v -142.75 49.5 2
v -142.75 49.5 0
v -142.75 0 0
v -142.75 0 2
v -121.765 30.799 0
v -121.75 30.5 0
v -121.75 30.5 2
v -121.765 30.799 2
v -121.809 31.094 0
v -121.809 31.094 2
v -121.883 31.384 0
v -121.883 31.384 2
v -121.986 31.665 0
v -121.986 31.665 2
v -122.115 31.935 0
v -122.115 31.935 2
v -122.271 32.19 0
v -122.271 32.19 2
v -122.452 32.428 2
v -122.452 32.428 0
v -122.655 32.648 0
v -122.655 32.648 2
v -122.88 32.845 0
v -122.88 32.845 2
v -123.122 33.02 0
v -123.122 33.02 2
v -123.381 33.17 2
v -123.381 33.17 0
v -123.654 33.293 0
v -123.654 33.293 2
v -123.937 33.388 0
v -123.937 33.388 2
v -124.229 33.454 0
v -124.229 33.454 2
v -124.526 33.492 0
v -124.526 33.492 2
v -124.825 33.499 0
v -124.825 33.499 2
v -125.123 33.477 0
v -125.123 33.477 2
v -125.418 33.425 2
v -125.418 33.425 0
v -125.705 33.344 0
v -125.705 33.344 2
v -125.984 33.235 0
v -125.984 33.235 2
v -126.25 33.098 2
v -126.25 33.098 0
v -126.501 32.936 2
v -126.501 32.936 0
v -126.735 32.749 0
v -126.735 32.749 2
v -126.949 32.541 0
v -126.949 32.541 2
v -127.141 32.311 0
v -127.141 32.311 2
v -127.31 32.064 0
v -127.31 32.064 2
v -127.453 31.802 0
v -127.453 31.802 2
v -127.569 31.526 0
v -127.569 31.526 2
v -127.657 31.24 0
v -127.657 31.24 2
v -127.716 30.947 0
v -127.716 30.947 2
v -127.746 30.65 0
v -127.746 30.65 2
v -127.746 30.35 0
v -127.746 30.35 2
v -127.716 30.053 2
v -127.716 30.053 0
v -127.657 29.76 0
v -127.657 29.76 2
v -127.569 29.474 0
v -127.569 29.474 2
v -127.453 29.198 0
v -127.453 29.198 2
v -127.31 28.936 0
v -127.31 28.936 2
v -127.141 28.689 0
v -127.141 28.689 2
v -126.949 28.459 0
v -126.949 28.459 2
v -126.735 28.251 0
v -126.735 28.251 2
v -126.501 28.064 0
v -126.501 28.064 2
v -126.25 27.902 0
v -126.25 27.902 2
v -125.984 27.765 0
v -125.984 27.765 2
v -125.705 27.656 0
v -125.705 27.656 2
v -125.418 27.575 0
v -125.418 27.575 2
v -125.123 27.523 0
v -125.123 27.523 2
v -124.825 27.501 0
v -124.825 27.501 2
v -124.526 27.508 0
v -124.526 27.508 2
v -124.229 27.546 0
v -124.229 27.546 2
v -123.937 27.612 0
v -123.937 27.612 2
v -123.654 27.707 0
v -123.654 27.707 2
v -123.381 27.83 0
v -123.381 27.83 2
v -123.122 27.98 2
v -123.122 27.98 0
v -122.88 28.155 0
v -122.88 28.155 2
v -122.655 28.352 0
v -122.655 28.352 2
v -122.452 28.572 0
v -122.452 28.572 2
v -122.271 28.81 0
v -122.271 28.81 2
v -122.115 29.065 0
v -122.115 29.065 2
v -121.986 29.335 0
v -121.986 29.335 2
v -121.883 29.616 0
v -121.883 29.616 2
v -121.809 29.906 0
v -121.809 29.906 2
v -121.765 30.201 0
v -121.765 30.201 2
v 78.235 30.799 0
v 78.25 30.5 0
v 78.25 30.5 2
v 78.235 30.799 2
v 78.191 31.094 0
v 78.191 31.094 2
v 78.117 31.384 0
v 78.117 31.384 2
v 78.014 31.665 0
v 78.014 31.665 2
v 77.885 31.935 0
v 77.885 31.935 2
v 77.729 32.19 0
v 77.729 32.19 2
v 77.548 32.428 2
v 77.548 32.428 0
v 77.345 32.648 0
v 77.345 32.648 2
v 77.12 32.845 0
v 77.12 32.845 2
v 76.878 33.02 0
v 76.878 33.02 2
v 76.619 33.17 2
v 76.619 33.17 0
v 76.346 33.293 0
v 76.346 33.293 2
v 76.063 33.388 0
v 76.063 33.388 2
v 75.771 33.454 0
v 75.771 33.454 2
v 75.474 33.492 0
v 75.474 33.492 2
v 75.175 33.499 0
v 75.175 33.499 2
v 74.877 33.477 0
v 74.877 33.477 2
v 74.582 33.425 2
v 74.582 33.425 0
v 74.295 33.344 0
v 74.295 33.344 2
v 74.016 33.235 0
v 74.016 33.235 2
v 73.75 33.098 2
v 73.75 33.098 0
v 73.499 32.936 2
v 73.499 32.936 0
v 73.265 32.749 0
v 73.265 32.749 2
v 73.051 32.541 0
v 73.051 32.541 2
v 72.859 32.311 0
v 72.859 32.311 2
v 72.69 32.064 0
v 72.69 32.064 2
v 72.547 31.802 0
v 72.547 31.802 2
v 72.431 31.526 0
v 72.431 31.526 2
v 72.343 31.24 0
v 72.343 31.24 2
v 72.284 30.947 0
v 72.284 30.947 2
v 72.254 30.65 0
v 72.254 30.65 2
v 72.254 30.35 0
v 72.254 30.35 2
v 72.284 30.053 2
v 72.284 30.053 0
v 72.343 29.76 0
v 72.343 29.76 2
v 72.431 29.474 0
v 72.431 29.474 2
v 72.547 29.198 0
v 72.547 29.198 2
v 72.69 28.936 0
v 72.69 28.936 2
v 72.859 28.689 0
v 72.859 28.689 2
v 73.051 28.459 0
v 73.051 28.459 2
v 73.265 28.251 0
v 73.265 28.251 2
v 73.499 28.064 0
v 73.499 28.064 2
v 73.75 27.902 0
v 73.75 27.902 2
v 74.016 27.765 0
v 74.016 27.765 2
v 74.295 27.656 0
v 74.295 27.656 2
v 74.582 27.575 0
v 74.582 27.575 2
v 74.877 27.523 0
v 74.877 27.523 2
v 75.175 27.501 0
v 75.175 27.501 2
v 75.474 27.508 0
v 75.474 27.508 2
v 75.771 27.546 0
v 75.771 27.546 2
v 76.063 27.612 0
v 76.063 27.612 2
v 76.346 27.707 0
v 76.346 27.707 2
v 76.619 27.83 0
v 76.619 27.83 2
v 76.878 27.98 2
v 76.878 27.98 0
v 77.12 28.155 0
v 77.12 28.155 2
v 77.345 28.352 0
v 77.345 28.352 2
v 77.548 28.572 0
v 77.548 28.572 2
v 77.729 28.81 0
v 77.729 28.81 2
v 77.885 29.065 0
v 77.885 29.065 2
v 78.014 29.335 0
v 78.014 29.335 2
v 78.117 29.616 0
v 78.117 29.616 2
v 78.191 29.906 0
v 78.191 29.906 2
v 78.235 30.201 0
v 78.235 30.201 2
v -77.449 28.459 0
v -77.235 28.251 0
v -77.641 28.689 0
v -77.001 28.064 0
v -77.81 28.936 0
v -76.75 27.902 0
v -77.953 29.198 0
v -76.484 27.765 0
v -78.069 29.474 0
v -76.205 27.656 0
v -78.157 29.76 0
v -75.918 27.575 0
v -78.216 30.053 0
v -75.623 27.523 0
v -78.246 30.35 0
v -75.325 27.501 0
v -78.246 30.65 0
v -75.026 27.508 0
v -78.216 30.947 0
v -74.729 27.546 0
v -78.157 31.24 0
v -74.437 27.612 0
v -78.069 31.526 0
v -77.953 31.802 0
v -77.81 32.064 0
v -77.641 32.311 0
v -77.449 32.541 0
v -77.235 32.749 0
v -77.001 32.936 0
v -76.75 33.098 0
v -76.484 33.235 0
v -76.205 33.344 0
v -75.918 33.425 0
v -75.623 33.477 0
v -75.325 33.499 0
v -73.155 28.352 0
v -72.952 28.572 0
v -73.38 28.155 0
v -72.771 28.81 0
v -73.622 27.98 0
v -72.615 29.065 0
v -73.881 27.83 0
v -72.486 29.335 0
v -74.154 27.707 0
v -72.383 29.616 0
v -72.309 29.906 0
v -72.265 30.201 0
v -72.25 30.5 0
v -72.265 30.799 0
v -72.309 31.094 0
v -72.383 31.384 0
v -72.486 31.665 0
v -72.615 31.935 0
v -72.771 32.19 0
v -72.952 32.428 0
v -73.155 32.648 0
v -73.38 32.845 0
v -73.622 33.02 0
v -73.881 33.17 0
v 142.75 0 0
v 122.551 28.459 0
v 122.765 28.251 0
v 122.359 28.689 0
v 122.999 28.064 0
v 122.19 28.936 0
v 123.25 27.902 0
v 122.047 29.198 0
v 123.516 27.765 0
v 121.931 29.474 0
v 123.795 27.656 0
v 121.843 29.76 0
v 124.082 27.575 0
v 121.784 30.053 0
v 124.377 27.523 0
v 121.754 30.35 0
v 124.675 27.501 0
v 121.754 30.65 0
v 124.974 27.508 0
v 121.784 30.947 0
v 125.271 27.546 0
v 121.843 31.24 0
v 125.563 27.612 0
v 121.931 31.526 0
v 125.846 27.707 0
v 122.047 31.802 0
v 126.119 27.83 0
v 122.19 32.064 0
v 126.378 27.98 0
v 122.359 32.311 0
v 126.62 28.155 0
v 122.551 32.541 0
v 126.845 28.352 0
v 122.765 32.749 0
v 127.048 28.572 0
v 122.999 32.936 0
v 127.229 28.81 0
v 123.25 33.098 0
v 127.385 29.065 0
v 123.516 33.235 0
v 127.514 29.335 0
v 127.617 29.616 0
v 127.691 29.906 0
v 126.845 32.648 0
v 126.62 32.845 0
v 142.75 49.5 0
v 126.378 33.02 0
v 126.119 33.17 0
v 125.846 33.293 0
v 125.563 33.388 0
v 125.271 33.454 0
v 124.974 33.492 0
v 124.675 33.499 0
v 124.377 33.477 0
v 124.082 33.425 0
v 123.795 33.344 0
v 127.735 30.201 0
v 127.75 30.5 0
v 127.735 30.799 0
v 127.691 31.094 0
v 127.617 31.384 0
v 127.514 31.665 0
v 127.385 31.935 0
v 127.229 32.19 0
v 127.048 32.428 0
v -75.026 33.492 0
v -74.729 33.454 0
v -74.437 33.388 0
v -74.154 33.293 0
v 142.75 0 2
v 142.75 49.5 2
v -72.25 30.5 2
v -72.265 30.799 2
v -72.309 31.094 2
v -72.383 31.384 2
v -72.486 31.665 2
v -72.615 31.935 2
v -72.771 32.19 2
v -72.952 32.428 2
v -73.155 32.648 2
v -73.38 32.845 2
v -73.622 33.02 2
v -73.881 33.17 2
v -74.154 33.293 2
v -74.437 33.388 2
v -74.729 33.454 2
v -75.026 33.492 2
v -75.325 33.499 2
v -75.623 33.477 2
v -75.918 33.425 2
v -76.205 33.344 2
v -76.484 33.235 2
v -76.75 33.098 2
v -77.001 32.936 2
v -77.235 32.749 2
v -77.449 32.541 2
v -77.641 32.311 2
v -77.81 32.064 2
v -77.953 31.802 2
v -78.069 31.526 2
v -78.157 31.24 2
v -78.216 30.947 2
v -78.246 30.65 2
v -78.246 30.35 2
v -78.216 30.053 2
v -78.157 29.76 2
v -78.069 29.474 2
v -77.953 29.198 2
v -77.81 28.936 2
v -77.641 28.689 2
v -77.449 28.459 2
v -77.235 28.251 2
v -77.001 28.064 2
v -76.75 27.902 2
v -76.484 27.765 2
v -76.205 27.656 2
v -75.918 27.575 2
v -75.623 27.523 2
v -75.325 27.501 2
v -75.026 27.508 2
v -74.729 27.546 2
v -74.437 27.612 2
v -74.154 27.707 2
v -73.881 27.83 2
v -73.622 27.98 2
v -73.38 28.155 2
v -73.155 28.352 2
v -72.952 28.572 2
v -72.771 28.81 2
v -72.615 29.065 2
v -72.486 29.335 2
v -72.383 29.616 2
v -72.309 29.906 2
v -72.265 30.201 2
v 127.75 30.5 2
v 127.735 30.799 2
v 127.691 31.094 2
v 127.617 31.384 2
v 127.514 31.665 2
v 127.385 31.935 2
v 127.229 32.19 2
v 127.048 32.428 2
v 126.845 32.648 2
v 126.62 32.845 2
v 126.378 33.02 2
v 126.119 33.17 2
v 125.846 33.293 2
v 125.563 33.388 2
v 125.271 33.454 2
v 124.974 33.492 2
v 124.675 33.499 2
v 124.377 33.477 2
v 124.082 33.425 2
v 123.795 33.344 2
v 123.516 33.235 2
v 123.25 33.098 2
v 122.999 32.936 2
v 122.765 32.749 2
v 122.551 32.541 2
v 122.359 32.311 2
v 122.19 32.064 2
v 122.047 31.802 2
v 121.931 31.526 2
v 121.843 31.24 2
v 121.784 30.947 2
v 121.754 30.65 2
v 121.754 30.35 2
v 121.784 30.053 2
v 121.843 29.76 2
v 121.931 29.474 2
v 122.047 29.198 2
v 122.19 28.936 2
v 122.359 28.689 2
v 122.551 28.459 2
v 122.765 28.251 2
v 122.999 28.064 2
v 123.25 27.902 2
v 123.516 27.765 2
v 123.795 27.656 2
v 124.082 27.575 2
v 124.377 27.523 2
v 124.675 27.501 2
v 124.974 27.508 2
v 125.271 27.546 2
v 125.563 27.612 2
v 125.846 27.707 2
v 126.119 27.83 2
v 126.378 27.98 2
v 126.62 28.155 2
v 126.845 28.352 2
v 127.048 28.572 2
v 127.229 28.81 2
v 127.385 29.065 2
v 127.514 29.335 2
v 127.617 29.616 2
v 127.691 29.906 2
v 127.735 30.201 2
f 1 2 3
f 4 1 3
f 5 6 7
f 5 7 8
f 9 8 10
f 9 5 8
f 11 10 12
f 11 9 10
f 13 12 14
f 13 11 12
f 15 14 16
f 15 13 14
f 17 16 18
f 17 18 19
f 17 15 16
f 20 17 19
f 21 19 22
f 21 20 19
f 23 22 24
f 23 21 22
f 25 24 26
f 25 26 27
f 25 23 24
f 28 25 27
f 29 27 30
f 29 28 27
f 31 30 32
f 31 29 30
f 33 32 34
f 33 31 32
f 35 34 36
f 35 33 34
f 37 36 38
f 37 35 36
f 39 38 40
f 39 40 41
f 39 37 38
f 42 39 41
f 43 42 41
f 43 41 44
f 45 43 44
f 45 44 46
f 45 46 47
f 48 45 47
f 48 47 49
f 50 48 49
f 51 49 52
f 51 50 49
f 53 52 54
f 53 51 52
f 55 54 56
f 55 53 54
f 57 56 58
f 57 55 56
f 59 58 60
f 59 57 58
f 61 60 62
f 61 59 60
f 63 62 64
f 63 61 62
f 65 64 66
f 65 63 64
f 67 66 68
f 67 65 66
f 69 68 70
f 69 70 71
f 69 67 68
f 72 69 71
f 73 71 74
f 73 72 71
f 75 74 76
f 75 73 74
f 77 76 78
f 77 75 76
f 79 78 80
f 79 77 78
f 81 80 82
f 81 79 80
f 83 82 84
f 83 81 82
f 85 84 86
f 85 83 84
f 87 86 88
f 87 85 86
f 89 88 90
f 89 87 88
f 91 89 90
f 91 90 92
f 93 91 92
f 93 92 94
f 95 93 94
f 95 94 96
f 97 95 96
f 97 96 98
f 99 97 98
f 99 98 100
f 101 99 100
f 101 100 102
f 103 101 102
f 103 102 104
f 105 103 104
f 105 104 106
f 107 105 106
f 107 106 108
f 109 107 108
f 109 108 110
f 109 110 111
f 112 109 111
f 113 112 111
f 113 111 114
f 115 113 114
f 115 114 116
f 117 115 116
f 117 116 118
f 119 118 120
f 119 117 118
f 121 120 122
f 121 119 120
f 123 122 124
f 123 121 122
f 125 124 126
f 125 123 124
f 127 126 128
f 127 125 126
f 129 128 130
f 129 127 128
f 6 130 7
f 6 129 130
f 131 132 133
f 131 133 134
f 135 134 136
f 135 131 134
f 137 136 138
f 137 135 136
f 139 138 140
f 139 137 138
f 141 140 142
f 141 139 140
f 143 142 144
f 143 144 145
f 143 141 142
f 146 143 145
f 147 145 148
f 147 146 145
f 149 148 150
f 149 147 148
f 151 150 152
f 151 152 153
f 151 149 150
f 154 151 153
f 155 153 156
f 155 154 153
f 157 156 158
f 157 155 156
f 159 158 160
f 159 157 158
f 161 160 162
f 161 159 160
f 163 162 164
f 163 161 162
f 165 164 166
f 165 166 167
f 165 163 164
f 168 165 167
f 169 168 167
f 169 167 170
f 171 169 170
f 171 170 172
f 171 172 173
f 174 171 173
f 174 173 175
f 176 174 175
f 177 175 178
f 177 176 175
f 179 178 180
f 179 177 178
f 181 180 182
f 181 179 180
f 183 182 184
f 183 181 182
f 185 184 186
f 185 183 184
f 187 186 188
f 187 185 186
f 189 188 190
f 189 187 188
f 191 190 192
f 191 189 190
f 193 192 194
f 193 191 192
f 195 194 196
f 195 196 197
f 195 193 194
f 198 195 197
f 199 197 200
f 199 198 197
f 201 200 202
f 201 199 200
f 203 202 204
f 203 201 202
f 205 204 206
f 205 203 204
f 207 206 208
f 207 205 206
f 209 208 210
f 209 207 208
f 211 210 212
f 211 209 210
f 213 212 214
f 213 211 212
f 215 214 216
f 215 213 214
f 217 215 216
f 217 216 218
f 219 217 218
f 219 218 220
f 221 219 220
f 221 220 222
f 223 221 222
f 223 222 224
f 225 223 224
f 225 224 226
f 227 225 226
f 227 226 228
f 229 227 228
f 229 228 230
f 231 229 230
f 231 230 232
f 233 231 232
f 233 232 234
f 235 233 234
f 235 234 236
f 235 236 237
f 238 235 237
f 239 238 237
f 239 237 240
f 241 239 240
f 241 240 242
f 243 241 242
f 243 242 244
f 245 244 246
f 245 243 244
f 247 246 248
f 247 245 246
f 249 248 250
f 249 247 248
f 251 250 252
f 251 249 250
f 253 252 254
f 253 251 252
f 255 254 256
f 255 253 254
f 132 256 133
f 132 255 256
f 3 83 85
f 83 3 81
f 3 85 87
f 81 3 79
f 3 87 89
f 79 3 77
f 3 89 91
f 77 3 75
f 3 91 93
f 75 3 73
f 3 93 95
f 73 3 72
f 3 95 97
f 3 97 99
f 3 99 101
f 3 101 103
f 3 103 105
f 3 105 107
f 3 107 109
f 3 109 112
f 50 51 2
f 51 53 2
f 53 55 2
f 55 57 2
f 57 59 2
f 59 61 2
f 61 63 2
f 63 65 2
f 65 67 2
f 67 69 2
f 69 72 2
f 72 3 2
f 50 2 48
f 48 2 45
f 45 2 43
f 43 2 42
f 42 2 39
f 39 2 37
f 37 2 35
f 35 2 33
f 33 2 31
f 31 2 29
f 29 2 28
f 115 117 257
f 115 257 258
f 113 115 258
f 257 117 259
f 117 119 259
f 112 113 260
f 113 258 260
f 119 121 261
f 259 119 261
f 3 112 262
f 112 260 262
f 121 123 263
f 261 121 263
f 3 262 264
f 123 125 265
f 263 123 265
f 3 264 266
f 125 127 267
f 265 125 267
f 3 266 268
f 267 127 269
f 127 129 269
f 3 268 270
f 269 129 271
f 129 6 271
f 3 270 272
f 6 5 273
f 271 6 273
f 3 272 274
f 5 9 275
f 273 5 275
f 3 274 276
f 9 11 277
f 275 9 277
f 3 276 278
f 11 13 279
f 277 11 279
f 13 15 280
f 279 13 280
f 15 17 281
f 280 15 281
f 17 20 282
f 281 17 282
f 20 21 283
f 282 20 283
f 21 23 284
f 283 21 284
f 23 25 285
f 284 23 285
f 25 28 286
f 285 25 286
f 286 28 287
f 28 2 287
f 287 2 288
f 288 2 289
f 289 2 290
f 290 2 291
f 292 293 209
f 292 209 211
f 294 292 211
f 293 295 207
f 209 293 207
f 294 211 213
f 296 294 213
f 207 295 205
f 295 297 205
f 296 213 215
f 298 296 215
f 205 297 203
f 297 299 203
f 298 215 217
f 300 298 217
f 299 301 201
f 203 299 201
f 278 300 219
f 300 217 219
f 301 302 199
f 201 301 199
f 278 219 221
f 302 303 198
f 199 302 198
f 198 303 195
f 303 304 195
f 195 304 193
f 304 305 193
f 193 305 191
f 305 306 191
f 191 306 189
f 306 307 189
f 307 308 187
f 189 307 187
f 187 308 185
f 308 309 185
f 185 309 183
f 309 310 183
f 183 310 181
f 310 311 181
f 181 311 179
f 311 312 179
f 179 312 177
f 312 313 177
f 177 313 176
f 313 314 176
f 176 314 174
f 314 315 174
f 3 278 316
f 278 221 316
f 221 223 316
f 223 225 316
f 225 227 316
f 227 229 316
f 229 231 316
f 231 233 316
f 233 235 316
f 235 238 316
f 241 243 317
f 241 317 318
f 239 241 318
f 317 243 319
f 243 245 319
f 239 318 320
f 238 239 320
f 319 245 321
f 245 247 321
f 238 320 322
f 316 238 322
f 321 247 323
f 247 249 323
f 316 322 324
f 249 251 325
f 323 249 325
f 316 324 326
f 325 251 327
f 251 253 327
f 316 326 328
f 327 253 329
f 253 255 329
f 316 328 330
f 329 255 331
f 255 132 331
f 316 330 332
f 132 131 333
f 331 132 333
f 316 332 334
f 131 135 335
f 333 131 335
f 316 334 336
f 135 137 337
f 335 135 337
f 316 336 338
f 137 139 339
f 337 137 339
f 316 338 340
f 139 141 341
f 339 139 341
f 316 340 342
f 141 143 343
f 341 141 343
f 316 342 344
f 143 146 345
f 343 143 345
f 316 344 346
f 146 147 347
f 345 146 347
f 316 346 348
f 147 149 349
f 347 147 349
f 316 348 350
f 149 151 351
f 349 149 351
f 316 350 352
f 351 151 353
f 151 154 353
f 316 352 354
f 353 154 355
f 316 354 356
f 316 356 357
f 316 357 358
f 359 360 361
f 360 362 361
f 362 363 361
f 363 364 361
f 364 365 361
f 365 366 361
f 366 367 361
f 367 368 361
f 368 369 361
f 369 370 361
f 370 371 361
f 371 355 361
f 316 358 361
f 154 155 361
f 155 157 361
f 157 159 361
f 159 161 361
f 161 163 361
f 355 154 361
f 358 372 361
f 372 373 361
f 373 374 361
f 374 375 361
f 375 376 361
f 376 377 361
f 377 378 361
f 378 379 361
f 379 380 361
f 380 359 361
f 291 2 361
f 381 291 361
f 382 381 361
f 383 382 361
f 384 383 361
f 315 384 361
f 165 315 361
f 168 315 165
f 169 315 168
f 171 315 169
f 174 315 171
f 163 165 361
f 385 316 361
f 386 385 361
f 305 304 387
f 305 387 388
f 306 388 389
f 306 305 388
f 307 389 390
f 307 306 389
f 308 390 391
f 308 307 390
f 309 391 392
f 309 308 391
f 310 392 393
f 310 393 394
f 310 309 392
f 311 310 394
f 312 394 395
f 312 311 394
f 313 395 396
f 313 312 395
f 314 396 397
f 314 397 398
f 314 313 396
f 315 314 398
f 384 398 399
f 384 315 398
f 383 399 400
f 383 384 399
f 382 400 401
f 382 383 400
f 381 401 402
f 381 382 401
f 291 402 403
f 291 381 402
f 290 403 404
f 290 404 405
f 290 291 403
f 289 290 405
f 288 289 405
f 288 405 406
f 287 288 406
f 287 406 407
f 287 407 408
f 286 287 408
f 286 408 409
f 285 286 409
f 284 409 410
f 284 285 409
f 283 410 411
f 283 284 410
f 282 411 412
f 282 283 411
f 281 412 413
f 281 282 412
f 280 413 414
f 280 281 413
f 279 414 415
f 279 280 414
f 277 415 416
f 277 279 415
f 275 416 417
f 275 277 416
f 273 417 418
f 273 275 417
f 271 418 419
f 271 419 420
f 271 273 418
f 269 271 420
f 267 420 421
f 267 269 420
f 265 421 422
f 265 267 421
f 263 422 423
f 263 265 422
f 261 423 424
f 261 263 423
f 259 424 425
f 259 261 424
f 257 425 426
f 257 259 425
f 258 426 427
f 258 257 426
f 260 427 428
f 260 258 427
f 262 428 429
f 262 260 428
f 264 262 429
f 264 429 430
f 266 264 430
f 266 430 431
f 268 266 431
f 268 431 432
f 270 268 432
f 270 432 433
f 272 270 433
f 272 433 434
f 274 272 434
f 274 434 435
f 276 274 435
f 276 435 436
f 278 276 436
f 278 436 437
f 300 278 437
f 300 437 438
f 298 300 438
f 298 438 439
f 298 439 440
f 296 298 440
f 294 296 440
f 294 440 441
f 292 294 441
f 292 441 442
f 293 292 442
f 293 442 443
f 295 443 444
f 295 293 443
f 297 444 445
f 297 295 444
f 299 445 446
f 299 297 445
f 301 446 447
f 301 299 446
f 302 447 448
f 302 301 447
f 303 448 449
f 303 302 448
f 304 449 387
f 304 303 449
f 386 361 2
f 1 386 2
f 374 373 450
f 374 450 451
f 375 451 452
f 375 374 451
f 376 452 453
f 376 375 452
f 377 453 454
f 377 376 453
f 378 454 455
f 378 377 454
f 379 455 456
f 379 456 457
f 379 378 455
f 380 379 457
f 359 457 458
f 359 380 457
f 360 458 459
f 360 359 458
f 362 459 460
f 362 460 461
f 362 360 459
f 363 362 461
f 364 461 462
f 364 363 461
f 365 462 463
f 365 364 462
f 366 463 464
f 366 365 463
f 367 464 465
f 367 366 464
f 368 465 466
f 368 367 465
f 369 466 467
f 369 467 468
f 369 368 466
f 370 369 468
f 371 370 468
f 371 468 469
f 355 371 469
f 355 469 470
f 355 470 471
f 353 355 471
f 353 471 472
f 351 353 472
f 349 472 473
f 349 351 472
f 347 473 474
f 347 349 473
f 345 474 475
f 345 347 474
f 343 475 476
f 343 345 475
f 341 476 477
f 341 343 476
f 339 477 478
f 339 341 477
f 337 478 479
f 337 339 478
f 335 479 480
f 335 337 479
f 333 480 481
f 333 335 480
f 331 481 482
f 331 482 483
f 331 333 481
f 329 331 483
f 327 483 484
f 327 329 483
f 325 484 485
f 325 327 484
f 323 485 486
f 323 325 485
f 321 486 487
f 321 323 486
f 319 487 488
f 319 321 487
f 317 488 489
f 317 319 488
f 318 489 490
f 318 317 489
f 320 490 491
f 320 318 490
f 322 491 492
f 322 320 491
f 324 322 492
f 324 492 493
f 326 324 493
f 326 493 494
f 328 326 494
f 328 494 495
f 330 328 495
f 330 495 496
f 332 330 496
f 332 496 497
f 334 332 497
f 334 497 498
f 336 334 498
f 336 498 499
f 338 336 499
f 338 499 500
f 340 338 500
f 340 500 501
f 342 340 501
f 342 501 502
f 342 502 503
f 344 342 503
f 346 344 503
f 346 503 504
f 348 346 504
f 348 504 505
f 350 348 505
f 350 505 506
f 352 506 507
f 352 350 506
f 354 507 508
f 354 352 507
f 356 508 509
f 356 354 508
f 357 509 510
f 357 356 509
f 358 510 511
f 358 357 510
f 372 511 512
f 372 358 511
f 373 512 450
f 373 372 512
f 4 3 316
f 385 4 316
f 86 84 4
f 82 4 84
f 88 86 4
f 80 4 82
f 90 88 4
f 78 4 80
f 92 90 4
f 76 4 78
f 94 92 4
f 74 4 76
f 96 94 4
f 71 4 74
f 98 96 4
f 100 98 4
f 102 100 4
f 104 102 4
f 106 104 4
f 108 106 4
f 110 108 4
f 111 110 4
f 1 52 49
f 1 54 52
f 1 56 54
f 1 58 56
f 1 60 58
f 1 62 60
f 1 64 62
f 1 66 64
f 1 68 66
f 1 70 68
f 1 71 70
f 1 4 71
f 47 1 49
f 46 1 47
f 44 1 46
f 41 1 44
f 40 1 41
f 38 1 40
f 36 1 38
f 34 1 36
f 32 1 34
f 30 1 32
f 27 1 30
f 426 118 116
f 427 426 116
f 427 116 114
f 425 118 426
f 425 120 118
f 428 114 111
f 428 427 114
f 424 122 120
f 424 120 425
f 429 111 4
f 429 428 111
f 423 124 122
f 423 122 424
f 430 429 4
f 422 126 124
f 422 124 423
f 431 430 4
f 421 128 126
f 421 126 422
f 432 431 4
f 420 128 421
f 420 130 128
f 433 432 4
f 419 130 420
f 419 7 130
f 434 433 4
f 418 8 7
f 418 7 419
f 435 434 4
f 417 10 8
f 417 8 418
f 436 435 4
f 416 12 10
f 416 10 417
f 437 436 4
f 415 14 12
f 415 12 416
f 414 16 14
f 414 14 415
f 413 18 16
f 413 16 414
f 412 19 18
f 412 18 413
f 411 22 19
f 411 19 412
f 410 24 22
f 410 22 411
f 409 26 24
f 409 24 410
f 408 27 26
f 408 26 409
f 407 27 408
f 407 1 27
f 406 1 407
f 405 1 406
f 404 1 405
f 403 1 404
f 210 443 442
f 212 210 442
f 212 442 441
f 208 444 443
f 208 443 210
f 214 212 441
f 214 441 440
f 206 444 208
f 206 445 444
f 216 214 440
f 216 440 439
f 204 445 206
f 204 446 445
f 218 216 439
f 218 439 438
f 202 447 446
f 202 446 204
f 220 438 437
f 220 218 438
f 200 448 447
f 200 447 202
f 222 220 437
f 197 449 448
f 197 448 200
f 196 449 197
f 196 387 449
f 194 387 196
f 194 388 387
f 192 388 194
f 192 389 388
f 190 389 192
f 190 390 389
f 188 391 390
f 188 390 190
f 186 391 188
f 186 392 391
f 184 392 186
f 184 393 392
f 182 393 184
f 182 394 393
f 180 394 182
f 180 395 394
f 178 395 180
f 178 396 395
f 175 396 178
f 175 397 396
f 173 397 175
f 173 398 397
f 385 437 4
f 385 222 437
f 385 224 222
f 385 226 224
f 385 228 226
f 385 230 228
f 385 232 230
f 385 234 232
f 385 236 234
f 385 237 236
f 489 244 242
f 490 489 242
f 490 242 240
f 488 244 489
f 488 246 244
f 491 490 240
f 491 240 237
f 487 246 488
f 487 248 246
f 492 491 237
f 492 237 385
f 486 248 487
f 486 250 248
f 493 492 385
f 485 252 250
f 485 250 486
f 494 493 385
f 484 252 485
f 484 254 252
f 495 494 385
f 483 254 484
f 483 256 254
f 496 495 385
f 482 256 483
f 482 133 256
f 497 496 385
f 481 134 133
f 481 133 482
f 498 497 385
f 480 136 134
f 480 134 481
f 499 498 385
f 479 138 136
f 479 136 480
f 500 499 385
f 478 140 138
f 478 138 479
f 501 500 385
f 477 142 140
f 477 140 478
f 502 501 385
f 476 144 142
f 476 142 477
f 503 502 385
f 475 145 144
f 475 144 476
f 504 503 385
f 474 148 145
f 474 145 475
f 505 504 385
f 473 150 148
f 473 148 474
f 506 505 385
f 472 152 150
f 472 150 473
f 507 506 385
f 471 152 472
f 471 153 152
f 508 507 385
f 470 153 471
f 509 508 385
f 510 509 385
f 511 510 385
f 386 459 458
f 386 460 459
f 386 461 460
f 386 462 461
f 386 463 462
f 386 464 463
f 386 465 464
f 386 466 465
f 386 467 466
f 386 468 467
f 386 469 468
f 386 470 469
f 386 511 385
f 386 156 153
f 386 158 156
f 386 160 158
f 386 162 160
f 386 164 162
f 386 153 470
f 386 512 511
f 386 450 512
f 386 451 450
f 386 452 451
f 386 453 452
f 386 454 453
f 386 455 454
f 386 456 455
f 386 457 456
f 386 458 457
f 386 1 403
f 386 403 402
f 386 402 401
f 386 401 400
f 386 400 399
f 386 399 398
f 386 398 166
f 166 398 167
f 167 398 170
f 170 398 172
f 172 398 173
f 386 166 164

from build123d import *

# Parameters (mm, degrees)
SKETCH1_R           = 3
BOSS_EXTRUDE1_DEPTH = 2


with BuildPart() as part:
    # Sketch1 → Boss-Extrude1 (new body)
    with BuildSketch(Plane.XY):
        Polygon((-142.75, 49.5), (-142.75, 0), (0, 0), (142.75, 0), (142.75, 49.5), align=None)
        with Locations((124.75, 30.5)):
            Circle(SKETCH1_R, mode=Mode.SUBTRACT)
        with Locations((75.25, 30.5)):
            Circle(SKETCH1_R, mode=Mode.SUBTRACT)
        with Locations((-75.25, 30.5)):
            Circle(SKETCH1_R, mode=Mode.SUBTRACT)
        with Locations((-124.75, 30.5)):
            Circle(SKETCH1_R, mode=Mode.SUBTRACT)
    extrude(amount=BOSS_EXTRUDE1_DEPTH)


solid = part.part
